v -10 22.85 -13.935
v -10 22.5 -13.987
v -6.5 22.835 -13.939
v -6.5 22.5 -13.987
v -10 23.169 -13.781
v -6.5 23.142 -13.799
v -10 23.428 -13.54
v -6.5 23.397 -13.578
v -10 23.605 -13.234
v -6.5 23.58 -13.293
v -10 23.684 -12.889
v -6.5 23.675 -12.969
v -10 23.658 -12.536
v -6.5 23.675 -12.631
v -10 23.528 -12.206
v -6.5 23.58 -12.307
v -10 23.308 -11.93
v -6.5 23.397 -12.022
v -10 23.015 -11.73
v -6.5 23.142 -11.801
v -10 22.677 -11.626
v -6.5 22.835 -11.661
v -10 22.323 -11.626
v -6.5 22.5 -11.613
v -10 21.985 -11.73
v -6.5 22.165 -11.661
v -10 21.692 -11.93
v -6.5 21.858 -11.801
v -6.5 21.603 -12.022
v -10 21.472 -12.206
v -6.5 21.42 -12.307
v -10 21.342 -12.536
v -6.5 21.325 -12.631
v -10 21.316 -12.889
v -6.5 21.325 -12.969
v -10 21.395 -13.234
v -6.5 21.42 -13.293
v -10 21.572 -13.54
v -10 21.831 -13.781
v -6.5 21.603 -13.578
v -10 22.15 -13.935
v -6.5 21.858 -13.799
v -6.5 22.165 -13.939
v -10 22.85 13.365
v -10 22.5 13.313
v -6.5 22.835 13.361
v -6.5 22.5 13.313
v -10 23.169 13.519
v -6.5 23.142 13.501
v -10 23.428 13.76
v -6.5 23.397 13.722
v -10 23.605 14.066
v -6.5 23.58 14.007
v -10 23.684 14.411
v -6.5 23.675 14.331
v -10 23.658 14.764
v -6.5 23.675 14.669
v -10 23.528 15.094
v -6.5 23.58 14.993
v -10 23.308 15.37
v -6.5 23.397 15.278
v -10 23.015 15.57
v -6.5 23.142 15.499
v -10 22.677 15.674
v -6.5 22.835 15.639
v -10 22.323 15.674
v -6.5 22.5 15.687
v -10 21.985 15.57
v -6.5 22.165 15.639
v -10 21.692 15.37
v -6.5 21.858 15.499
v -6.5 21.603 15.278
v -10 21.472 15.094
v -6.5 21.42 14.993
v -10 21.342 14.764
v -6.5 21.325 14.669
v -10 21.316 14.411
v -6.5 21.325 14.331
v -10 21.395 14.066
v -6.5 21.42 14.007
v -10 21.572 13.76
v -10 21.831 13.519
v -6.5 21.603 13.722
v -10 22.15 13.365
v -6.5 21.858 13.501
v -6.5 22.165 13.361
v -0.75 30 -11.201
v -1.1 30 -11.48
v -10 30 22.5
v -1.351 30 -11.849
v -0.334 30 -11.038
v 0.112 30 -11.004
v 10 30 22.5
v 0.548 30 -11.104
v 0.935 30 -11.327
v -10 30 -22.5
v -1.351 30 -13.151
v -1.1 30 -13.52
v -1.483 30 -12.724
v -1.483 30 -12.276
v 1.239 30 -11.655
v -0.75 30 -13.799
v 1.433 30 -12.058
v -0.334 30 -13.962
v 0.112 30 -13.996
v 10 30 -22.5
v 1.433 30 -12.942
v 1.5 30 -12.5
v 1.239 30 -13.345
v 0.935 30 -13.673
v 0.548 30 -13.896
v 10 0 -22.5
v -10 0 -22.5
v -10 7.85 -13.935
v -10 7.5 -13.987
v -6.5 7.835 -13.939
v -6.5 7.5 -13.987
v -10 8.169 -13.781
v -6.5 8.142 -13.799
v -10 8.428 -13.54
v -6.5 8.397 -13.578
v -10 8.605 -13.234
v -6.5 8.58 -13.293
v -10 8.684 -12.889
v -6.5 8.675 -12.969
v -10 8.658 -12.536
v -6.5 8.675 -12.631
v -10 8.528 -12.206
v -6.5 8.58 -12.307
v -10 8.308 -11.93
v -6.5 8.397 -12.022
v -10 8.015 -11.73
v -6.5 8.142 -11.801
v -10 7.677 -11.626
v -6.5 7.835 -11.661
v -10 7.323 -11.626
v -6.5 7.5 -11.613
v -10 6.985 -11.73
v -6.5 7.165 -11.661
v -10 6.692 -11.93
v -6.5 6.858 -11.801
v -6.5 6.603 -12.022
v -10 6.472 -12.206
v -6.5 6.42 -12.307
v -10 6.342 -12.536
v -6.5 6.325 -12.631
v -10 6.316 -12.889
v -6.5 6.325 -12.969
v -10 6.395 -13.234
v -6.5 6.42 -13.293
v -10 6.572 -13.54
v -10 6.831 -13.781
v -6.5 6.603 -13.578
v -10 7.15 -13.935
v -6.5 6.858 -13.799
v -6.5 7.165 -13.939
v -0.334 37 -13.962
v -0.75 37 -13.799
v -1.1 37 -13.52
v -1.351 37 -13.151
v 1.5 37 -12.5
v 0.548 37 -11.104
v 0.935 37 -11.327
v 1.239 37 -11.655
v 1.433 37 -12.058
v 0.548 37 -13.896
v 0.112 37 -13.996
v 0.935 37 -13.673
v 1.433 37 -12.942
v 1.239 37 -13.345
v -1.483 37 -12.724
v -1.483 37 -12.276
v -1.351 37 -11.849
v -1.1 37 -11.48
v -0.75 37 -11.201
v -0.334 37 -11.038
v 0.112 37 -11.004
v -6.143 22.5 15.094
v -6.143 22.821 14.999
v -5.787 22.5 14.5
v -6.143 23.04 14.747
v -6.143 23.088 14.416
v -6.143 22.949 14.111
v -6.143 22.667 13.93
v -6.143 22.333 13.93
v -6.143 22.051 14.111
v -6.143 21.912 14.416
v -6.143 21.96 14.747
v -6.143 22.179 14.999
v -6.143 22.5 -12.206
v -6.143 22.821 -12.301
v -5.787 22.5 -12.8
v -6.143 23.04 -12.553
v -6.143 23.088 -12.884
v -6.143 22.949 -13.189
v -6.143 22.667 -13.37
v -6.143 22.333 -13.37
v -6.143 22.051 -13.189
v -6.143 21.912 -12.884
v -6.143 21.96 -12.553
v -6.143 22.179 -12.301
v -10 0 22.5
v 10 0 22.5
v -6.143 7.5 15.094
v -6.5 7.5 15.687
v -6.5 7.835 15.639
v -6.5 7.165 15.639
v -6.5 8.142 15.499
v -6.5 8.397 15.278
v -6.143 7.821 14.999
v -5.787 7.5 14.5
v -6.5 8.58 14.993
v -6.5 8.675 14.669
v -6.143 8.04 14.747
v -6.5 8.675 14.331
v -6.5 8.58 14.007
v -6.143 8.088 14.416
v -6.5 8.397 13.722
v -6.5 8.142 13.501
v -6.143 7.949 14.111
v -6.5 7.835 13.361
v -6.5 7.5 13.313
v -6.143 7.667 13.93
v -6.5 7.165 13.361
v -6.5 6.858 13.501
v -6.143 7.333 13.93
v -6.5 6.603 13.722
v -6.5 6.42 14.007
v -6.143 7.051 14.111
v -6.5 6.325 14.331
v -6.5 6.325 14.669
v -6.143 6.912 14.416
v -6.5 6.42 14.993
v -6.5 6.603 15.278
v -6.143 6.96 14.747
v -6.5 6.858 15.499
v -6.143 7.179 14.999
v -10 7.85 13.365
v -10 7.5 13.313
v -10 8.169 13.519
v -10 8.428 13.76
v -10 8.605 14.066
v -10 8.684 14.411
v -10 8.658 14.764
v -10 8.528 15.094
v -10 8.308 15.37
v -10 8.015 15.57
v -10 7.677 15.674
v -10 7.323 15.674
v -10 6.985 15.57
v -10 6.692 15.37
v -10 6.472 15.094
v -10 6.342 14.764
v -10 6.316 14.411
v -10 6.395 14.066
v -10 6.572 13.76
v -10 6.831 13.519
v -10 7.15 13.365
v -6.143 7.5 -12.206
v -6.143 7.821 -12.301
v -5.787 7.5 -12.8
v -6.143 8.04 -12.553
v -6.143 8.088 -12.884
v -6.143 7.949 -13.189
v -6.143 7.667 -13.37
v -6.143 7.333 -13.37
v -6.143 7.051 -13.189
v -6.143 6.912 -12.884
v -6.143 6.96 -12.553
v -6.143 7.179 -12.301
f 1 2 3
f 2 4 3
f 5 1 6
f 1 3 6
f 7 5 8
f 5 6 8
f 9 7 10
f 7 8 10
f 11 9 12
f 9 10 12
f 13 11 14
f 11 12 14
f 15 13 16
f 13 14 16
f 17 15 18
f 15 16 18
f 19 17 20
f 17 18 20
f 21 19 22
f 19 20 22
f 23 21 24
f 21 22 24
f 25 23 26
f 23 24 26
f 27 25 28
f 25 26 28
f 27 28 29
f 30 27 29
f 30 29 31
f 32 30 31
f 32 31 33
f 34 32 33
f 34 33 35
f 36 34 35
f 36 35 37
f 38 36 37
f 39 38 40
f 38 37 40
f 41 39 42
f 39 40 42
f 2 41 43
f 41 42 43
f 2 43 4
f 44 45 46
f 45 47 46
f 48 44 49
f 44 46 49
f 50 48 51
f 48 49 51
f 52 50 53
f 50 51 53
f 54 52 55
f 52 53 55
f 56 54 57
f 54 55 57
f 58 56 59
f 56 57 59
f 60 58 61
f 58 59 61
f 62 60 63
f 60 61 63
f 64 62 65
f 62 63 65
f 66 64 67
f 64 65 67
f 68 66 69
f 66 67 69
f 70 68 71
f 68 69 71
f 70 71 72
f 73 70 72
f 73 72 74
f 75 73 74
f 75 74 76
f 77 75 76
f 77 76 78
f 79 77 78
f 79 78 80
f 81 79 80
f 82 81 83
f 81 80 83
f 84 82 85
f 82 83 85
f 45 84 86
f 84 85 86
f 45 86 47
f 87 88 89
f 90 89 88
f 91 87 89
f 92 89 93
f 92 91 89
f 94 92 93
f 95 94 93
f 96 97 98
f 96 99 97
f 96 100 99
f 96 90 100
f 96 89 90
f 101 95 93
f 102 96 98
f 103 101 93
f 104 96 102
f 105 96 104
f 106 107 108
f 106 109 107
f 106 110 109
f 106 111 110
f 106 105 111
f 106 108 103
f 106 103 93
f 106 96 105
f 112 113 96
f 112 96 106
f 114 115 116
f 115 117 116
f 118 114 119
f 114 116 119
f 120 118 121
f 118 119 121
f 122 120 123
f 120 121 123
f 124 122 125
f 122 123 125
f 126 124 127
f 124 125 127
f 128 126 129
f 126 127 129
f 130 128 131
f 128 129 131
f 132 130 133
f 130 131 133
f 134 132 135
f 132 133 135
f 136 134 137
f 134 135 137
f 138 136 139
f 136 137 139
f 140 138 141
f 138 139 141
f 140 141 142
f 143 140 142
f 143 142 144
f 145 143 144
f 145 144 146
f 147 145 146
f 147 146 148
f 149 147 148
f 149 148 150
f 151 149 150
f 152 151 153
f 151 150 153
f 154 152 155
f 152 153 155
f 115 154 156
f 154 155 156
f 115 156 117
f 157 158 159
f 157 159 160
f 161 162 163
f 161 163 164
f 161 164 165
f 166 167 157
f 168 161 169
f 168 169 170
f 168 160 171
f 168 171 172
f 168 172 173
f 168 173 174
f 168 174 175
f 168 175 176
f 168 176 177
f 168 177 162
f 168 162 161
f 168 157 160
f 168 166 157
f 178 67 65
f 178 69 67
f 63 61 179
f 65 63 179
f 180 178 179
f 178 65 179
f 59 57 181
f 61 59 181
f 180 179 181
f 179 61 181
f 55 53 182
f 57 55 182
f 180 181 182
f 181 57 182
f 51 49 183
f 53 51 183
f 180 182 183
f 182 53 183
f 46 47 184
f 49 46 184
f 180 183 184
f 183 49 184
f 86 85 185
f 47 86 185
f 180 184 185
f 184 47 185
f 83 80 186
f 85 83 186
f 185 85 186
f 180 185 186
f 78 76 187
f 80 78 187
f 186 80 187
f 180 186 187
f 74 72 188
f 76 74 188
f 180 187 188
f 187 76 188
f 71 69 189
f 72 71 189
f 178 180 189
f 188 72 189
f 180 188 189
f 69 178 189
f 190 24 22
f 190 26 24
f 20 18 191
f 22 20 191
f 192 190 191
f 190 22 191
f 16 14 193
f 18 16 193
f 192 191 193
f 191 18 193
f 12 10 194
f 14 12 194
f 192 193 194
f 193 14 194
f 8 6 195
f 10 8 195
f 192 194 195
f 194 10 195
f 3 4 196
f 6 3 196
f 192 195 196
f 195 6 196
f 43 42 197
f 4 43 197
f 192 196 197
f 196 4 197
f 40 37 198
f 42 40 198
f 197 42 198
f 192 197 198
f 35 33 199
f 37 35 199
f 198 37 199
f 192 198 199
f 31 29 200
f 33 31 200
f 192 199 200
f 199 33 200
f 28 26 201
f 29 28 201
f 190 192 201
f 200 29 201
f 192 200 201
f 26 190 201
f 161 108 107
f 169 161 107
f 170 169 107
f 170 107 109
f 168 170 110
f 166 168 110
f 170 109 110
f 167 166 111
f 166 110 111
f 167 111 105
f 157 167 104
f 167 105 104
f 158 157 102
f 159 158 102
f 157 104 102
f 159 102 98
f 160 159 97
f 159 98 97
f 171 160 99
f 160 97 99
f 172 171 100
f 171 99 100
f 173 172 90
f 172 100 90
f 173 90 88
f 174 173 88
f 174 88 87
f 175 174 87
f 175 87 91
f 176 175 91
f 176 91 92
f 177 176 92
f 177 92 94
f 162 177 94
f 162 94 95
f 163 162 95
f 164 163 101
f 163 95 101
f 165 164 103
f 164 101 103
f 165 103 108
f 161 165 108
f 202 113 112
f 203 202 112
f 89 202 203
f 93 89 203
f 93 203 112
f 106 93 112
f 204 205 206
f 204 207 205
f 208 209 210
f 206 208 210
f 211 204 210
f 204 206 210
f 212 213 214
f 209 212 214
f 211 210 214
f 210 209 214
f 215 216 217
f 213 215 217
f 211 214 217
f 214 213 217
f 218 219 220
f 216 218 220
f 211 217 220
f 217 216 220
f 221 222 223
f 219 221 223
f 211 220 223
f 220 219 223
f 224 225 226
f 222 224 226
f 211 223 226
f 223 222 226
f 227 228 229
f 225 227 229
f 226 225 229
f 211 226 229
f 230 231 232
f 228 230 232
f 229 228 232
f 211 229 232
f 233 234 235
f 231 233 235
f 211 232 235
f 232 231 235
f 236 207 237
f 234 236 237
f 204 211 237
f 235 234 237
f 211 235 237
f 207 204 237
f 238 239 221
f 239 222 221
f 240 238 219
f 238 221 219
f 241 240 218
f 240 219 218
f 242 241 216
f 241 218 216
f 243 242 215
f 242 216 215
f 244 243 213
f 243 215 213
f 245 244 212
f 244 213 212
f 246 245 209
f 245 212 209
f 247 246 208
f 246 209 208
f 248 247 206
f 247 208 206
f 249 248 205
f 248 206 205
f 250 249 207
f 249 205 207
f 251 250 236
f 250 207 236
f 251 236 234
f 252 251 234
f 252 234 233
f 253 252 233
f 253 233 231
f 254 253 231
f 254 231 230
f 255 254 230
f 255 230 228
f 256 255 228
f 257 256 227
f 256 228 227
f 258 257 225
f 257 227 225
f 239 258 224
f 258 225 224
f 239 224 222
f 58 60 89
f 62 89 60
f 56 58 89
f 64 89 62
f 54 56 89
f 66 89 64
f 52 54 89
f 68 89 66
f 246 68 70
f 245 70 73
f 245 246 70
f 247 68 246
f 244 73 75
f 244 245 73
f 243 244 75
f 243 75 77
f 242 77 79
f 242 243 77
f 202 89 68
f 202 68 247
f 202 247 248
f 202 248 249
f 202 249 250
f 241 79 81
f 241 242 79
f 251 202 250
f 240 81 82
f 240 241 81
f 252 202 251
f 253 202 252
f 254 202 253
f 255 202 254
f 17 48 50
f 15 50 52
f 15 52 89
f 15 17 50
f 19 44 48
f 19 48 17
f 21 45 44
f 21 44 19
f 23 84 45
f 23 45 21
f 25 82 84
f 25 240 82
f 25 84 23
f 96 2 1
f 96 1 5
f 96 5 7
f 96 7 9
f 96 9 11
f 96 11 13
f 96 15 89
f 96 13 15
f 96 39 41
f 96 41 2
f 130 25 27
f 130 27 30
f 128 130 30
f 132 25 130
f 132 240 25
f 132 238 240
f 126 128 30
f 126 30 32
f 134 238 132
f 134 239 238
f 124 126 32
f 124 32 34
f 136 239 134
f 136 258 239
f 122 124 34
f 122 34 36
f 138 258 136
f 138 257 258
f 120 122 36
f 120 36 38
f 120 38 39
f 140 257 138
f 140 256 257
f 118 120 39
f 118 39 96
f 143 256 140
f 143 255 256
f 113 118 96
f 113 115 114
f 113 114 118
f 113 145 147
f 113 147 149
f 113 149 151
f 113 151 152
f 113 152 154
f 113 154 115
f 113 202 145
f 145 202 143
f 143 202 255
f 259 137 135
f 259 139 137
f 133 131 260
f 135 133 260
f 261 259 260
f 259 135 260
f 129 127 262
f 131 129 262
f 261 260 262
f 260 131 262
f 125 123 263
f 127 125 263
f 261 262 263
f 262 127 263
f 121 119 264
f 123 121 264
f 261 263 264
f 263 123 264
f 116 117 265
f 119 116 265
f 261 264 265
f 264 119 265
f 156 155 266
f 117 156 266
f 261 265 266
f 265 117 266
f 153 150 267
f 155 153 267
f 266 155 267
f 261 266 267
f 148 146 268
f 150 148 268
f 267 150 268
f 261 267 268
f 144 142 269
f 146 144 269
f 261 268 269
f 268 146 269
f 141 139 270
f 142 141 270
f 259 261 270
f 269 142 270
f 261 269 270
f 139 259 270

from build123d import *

# Parameters (mm, degrees)
SKETCH1_W                 = 20
SKETCH1_H                 = 45
BOSS_EXTRUDE1_DEPTH       = 30
SKETCH2_R                 = 1.5
BOSS_EXTRUDE2_DEPTH       = 7
F_4_48_TAPPED_HOLE1_D     = 2.3749
F_4_48_TAPPED_HOLE1_DEPTH = 3.5
F_4_48_TAPPED_HOLE1_TIP   = 0.713491942


with BuildPart() as part:
    # Sketch1 → Boss-Extrude1 (new body)
    with BuildSketch(Plane(origin=(0, 0, 0), x_dir=(1, 0, 0), z_dir=(0, 1, 0))):
        Rectangle(SKETCH1_W, SKETCH1_H)
    extrude(amount=BOSS_EXTRUDE1_DEPTH)

    # Sketch2 → Boss-Extrude2 (add)
    with BuildSketch(Plane(origin=(0, 30, 0), x_dir=(1, 0, 0), z_dir=(0, 1, 0))):
        with Locations((0, 12.5)):
            Circle(SKETCH2_R)
    extrude(amount=BOSS_EXTRUDE2_DEPTH)

    # #4-48 Tapped Hole1
    with Locations(Plane.ZY.offset(10)):
        with Locations((-12.8, 7.5), (-12.8, 22.5), (14.5, 22.5), (14.5, 7.5)):
            Hole(F_4_48_TAPPED_HOLE1_D / 2, depth=F_4_48_TAPPED_HOLE1_DEPTH)
            with Locations((0, 0, -(F_4_48_TAPPED_HOLE1_DEPTH + F_4_48_TAPPED_HOLE1_TIP / 2))):  # 118° drill point
                Cone(0, F_4_48_TAPPED_HOLE1_D / 2, F_4_48_TAPPED_HOLE1_TIP, mode=Mode.SUBTRACT)


solid = part.part
